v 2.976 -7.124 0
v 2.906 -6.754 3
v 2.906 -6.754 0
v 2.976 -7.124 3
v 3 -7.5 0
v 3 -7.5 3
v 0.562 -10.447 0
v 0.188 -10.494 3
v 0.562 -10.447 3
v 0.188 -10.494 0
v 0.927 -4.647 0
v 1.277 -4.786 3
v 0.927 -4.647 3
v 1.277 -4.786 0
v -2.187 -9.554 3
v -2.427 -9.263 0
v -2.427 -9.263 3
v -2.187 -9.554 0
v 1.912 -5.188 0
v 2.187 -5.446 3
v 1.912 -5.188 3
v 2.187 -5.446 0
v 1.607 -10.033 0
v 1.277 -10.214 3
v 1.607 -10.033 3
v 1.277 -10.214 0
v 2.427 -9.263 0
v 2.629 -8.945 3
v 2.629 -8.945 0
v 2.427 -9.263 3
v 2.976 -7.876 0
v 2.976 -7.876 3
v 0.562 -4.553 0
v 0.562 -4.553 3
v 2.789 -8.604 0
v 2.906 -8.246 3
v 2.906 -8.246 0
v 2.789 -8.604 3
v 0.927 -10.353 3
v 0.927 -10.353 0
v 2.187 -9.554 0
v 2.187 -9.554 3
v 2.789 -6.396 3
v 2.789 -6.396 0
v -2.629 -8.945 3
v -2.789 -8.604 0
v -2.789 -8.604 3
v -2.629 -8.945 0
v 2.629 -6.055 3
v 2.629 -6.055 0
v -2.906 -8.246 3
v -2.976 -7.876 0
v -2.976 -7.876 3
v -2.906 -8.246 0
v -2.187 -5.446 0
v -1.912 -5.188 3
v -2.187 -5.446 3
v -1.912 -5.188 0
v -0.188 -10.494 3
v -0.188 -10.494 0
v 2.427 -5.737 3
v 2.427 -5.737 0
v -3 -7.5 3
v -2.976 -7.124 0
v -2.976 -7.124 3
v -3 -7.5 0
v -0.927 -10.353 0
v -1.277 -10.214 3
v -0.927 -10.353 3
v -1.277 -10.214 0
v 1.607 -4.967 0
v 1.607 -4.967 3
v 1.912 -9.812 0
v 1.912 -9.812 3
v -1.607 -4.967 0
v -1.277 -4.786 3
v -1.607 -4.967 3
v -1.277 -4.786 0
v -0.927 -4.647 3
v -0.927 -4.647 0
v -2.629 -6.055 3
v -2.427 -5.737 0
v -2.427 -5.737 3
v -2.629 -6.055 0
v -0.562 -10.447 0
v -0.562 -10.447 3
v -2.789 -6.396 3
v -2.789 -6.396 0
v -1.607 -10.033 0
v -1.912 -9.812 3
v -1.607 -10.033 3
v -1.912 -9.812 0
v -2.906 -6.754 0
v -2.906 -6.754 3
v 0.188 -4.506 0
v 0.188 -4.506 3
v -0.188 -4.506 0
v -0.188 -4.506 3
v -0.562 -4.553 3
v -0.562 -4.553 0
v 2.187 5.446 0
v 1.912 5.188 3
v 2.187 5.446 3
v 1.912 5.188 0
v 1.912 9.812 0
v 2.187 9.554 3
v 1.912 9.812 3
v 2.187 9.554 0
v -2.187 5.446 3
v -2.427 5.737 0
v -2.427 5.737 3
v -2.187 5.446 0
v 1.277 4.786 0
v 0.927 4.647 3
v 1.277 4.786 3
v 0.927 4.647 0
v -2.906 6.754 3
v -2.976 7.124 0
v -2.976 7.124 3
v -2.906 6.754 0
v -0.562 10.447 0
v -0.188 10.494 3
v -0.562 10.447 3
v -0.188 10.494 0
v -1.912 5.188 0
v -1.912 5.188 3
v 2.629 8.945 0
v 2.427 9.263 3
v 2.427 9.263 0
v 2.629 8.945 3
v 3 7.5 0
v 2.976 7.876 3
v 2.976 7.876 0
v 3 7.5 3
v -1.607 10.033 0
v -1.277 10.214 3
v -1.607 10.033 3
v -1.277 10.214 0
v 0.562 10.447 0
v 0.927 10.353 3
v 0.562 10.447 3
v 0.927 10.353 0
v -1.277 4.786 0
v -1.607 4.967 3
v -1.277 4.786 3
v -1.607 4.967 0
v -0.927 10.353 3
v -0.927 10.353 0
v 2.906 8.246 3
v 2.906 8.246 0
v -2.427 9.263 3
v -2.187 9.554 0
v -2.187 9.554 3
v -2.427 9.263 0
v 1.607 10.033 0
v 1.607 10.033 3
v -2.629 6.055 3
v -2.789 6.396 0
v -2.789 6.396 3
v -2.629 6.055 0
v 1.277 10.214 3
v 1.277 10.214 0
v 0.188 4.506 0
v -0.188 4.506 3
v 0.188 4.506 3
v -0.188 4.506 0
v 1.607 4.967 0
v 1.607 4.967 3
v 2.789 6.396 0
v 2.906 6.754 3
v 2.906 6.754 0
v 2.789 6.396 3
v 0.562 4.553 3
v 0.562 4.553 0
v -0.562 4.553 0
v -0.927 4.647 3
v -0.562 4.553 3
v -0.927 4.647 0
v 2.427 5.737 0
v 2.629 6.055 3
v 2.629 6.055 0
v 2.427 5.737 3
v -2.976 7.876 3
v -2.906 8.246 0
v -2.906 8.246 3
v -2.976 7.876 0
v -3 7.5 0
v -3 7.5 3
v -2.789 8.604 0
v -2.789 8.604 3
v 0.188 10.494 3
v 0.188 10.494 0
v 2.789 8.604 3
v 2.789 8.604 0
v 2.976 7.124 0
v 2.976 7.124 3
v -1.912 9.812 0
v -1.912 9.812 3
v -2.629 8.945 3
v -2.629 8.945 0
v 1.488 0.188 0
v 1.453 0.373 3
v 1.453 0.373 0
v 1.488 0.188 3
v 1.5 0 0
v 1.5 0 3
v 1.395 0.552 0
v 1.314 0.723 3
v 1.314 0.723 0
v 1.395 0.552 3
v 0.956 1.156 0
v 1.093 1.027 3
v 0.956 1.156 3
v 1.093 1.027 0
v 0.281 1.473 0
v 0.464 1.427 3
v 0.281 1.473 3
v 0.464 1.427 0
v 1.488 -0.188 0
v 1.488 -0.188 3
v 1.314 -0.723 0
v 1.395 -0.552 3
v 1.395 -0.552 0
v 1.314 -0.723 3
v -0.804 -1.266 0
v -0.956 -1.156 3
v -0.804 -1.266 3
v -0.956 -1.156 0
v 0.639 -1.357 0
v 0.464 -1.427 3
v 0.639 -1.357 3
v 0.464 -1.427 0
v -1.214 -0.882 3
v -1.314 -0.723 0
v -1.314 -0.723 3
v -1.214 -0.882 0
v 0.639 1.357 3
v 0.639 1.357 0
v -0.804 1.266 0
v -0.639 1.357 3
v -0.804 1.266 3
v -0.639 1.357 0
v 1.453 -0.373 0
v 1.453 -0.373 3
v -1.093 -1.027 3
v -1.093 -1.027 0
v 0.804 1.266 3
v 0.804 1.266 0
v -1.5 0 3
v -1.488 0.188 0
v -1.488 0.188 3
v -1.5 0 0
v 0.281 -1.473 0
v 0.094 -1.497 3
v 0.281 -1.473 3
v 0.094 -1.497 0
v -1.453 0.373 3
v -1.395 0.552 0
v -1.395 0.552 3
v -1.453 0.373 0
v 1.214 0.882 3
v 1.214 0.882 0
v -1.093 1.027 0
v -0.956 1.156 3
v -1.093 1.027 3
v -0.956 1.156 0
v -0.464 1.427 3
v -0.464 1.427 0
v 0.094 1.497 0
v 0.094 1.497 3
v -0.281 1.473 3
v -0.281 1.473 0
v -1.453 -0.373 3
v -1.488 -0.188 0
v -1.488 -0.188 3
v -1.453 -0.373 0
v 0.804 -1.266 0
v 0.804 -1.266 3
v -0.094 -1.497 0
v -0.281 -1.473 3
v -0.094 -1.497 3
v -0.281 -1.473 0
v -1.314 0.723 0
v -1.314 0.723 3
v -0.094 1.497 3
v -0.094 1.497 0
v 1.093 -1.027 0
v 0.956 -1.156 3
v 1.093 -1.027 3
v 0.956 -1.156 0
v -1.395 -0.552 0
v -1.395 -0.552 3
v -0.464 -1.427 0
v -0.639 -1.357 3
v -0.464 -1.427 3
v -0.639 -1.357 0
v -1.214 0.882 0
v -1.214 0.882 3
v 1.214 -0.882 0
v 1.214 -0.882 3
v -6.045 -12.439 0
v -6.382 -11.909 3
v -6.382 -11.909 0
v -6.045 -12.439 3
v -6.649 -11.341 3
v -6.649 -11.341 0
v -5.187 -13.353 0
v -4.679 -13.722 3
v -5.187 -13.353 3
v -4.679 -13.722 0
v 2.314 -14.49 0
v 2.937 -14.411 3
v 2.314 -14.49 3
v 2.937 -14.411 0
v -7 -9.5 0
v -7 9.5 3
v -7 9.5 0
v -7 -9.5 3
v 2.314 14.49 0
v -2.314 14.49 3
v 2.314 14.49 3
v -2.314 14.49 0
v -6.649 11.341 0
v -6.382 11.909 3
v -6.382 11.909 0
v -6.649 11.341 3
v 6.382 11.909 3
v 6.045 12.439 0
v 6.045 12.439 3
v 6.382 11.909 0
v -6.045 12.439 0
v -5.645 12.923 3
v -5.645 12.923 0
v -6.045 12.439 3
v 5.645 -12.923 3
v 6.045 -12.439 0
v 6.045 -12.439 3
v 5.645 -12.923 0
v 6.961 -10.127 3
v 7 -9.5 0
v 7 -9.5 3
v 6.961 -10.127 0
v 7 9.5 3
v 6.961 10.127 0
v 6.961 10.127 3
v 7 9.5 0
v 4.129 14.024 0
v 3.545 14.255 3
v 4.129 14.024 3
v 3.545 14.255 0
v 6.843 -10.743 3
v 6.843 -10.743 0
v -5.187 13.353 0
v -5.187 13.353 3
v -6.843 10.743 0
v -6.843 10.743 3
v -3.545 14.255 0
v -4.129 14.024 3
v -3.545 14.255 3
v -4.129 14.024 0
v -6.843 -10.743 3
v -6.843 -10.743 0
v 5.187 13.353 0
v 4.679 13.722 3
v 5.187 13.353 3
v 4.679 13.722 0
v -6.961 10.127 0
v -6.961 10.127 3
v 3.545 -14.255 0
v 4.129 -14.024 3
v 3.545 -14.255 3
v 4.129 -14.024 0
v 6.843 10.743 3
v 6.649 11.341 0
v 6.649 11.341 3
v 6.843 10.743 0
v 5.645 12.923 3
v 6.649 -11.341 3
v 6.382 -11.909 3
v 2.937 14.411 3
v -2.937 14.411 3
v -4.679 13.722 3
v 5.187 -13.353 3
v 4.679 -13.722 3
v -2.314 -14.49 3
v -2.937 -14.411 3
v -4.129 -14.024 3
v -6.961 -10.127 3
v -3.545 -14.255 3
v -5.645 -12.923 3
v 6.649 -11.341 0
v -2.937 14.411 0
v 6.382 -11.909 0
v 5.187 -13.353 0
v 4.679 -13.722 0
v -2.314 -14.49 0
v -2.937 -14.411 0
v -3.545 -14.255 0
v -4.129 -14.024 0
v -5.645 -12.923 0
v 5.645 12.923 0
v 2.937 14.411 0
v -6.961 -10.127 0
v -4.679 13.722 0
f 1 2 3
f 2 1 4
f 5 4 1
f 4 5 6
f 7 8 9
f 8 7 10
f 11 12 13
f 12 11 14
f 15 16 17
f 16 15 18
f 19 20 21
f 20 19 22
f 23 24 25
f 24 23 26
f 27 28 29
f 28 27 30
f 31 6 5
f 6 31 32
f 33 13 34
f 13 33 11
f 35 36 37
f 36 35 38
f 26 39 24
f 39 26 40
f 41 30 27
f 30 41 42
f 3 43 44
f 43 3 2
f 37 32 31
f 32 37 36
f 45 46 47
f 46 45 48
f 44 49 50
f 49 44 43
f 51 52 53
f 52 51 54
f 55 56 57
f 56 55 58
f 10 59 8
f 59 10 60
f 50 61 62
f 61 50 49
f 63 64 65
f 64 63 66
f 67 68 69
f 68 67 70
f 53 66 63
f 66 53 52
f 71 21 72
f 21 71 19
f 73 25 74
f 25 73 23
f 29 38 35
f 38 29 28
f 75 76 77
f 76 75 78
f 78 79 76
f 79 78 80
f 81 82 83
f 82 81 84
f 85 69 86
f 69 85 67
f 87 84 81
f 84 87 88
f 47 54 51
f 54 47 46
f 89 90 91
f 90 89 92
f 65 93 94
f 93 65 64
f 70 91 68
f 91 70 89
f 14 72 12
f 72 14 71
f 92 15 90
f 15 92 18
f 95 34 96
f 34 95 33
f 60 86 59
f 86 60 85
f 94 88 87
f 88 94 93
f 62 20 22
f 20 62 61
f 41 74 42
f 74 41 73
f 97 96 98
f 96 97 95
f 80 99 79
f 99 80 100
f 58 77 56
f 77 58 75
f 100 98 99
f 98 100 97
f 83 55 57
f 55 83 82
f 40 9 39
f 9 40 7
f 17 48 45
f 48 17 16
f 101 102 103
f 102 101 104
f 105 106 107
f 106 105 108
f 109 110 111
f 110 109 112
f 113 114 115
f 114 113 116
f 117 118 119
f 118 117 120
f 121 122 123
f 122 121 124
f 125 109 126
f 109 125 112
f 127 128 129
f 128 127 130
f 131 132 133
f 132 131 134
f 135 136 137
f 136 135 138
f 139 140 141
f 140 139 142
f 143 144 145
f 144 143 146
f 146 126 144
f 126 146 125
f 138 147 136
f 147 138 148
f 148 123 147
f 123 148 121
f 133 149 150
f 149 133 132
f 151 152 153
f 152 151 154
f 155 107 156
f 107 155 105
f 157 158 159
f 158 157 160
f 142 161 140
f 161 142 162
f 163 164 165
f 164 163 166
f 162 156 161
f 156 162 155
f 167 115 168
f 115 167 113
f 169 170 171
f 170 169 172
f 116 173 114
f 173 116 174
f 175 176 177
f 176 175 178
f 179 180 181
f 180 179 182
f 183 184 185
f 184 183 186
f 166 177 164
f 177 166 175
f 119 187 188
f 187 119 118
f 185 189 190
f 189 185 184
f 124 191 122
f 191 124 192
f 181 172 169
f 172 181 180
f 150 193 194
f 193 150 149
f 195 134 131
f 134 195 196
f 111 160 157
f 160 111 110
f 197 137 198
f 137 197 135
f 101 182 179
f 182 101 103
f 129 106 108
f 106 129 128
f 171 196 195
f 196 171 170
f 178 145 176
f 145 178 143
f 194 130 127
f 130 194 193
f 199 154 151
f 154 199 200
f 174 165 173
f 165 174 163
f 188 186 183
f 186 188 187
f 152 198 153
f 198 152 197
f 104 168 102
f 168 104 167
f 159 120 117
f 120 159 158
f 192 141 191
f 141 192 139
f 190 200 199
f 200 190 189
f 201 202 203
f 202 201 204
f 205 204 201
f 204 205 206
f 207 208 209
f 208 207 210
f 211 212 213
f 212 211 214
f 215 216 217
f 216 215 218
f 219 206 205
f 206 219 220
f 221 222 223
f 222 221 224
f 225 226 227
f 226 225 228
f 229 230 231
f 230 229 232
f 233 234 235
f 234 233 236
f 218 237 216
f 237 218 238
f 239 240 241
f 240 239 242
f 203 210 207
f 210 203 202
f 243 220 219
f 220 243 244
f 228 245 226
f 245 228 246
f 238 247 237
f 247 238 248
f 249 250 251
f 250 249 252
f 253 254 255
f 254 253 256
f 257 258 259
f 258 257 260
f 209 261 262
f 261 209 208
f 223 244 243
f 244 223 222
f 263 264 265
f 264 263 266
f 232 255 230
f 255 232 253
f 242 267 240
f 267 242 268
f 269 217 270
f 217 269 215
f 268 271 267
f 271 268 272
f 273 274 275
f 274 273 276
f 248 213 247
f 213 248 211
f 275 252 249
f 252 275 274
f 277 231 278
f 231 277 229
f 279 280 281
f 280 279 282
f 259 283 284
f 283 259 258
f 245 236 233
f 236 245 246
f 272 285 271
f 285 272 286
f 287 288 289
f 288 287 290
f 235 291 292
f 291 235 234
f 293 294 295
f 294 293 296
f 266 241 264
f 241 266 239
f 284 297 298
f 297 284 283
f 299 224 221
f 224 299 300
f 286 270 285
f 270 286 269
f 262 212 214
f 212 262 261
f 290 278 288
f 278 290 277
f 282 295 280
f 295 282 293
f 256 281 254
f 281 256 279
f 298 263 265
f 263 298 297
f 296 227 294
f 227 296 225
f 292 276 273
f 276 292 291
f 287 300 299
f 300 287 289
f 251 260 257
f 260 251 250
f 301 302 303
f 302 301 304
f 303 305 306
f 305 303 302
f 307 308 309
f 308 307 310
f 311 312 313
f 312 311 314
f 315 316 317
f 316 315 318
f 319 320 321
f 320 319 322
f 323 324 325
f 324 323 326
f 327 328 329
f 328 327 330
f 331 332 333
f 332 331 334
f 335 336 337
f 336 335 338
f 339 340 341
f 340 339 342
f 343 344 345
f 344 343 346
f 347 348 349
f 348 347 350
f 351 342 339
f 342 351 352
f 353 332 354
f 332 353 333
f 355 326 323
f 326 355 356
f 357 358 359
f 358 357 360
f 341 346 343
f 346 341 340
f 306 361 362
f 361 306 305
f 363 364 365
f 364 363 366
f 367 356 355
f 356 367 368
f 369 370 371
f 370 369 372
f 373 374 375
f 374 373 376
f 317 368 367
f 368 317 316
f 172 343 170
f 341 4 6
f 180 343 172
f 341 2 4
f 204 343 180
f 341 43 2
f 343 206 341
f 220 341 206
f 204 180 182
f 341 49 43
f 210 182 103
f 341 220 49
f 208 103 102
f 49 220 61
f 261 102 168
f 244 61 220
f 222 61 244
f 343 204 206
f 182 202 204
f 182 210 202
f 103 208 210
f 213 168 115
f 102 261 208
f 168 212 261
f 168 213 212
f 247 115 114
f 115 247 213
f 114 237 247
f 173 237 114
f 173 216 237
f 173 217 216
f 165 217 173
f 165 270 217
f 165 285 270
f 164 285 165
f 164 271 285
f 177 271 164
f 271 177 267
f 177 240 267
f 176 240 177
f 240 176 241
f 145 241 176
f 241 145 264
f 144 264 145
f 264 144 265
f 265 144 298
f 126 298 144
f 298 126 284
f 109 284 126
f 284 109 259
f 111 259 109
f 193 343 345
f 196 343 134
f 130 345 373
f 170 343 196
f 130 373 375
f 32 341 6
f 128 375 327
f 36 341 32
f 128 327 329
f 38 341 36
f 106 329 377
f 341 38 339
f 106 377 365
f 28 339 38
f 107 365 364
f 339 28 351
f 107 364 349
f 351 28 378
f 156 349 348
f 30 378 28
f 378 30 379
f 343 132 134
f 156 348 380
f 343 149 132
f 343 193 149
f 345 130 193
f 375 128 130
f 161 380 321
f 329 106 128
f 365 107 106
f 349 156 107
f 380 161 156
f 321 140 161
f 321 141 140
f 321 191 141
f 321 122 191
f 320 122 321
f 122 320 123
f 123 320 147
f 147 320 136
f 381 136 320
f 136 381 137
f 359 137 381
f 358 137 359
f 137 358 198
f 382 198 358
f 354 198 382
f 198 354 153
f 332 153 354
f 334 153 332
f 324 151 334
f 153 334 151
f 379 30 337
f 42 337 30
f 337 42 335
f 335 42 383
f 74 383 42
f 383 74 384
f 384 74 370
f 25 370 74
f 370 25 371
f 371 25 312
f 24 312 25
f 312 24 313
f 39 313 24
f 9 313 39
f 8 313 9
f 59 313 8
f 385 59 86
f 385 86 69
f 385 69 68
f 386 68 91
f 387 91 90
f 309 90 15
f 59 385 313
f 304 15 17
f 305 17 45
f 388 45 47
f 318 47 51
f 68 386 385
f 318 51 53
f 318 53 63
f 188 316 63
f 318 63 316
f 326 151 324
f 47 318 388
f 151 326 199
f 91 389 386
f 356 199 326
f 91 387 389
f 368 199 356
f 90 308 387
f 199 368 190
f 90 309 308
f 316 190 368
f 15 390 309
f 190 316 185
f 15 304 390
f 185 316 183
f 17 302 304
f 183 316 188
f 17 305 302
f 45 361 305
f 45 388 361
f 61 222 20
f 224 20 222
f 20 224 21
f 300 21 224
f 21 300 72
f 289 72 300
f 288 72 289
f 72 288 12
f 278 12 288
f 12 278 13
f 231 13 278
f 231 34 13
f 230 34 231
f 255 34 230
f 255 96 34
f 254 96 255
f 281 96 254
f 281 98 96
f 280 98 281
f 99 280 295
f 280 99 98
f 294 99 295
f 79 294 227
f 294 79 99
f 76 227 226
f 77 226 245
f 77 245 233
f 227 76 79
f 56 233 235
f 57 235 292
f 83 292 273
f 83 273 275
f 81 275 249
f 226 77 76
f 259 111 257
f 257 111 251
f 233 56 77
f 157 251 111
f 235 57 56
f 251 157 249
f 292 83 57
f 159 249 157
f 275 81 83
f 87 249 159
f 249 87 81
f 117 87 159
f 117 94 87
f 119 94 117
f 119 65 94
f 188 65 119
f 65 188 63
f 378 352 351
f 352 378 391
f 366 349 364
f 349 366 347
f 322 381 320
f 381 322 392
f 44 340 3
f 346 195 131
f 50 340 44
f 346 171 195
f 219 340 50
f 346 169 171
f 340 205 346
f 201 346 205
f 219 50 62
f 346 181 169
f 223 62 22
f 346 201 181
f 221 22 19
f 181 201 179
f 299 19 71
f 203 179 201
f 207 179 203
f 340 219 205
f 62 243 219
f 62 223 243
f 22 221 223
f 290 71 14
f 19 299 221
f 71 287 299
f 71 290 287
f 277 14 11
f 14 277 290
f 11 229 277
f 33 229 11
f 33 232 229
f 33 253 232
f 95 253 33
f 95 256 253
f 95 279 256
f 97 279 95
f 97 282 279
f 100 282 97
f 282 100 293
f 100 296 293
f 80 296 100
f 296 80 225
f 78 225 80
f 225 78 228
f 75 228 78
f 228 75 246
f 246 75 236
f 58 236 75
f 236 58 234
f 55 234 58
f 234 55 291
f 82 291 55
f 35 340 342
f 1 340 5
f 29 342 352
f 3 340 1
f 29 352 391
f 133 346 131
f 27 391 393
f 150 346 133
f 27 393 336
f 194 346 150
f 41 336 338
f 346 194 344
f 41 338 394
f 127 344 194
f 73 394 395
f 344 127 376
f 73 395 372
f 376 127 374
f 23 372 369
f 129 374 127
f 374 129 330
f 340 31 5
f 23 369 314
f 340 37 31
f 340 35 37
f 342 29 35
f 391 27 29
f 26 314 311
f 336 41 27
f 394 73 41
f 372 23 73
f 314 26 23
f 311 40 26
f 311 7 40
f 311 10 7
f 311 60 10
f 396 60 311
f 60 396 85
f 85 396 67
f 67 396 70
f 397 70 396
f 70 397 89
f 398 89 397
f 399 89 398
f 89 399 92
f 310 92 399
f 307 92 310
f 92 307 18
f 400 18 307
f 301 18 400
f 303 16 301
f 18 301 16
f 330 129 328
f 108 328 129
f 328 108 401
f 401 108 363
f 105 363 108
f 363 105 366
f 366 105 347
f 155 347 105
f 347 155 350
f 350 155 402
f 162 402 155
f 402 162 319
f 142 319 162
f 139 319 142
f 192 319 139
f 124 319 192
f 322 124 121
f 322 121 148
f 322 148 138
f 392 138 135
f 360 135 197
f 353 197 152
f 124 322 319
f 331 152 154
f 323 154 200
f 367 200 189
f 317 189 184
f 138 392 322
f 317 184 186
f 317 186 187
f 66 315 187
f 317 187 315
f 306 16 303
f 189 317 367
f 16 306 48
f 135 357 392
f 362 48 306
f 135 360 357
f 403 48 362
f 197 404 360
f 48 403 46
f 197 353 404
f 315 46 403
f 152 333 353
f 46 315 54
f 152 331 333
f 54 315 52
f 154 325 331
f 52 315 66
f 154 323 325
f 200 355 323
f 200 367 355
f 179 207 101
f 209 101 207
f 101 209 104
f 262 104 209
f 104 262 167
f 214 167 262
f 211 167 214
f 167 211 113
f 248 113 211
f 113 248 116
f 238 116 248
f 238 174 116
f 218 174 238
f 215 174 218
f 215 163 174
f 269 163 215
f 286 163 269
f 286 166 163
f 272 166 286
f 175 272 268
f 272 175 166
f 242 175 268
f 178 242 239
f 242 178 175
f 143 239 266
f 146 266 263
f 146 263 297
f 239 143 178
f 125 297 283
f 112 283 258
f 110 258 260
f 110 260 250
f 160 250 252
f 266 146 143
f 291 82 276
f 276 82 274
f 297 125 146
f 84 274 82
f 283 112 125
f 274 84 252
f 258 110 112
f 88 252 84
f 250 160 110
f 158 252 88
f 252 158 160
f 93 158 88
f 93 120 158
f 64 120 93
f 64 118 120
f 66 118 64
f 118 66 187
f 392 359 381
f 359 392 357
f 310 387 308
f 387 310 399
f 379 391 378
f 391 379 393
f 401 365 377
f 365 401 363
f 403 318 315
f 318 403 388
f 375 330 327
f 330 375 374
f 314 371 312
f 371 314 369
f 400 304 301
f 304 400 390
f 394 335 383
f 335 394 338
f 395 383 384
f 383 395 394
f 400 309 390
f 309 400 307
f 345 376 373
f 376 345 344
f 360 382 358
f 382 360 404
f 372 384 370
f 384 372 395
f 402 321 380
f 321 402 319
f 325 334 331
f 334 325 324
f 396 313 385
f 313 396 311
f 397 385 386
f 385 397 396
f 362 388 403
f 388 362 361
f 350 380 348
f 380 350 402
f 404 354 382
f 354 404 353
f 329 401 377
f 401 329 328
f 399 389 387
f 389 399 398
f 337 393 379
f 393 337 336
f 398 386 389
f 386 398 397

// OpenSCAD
$fn = 50;

difference() {
	union() {
		hull() {
			translate(v = [-2.0, 9.5, 0]) {
				cylinder(h = 3, r = 5);
			}
			translate(v = [2.0, 9.5, 0]) {
				cylinder(h = 3, r = 5);
			}
			translate(v = [-2.0, -9.5, 0]) {
				cylinder(h = 3, r = 5);
			}
			translate(v = [2.0, -9.5, 0]) {
				cylinder(h = 3, r = 5);
			}
		}
	}
	union() {
		translate(v = [0.0, -7.5, 0]) {
			translate(v = [0, 0, -100]) {
				cylinder(h = 200, r = 3.0);
			}
		}
		translate(v = [0.0, 7.5, 0]) {
			translate(v = [0, 0, -100]) {
				cylinder(h = 200, r = 3.0);
			}
		}
		translate(v = [0.0, -7.5, 0]) {
			translate(v = [0, 0, -100]) {
				cylinder(h = 200, r = 1.5);
			}
		}
		translate(v = [0, 0, -100]) {
			cylinder(h = 200, r = 1.5);
		}
		translate(v = [0.0, 7.5, 0]) {
			translate(v = [0, 0, -100]) {
				cylinder(h = 200, r = 1.5);
			}
		}
	}
}
